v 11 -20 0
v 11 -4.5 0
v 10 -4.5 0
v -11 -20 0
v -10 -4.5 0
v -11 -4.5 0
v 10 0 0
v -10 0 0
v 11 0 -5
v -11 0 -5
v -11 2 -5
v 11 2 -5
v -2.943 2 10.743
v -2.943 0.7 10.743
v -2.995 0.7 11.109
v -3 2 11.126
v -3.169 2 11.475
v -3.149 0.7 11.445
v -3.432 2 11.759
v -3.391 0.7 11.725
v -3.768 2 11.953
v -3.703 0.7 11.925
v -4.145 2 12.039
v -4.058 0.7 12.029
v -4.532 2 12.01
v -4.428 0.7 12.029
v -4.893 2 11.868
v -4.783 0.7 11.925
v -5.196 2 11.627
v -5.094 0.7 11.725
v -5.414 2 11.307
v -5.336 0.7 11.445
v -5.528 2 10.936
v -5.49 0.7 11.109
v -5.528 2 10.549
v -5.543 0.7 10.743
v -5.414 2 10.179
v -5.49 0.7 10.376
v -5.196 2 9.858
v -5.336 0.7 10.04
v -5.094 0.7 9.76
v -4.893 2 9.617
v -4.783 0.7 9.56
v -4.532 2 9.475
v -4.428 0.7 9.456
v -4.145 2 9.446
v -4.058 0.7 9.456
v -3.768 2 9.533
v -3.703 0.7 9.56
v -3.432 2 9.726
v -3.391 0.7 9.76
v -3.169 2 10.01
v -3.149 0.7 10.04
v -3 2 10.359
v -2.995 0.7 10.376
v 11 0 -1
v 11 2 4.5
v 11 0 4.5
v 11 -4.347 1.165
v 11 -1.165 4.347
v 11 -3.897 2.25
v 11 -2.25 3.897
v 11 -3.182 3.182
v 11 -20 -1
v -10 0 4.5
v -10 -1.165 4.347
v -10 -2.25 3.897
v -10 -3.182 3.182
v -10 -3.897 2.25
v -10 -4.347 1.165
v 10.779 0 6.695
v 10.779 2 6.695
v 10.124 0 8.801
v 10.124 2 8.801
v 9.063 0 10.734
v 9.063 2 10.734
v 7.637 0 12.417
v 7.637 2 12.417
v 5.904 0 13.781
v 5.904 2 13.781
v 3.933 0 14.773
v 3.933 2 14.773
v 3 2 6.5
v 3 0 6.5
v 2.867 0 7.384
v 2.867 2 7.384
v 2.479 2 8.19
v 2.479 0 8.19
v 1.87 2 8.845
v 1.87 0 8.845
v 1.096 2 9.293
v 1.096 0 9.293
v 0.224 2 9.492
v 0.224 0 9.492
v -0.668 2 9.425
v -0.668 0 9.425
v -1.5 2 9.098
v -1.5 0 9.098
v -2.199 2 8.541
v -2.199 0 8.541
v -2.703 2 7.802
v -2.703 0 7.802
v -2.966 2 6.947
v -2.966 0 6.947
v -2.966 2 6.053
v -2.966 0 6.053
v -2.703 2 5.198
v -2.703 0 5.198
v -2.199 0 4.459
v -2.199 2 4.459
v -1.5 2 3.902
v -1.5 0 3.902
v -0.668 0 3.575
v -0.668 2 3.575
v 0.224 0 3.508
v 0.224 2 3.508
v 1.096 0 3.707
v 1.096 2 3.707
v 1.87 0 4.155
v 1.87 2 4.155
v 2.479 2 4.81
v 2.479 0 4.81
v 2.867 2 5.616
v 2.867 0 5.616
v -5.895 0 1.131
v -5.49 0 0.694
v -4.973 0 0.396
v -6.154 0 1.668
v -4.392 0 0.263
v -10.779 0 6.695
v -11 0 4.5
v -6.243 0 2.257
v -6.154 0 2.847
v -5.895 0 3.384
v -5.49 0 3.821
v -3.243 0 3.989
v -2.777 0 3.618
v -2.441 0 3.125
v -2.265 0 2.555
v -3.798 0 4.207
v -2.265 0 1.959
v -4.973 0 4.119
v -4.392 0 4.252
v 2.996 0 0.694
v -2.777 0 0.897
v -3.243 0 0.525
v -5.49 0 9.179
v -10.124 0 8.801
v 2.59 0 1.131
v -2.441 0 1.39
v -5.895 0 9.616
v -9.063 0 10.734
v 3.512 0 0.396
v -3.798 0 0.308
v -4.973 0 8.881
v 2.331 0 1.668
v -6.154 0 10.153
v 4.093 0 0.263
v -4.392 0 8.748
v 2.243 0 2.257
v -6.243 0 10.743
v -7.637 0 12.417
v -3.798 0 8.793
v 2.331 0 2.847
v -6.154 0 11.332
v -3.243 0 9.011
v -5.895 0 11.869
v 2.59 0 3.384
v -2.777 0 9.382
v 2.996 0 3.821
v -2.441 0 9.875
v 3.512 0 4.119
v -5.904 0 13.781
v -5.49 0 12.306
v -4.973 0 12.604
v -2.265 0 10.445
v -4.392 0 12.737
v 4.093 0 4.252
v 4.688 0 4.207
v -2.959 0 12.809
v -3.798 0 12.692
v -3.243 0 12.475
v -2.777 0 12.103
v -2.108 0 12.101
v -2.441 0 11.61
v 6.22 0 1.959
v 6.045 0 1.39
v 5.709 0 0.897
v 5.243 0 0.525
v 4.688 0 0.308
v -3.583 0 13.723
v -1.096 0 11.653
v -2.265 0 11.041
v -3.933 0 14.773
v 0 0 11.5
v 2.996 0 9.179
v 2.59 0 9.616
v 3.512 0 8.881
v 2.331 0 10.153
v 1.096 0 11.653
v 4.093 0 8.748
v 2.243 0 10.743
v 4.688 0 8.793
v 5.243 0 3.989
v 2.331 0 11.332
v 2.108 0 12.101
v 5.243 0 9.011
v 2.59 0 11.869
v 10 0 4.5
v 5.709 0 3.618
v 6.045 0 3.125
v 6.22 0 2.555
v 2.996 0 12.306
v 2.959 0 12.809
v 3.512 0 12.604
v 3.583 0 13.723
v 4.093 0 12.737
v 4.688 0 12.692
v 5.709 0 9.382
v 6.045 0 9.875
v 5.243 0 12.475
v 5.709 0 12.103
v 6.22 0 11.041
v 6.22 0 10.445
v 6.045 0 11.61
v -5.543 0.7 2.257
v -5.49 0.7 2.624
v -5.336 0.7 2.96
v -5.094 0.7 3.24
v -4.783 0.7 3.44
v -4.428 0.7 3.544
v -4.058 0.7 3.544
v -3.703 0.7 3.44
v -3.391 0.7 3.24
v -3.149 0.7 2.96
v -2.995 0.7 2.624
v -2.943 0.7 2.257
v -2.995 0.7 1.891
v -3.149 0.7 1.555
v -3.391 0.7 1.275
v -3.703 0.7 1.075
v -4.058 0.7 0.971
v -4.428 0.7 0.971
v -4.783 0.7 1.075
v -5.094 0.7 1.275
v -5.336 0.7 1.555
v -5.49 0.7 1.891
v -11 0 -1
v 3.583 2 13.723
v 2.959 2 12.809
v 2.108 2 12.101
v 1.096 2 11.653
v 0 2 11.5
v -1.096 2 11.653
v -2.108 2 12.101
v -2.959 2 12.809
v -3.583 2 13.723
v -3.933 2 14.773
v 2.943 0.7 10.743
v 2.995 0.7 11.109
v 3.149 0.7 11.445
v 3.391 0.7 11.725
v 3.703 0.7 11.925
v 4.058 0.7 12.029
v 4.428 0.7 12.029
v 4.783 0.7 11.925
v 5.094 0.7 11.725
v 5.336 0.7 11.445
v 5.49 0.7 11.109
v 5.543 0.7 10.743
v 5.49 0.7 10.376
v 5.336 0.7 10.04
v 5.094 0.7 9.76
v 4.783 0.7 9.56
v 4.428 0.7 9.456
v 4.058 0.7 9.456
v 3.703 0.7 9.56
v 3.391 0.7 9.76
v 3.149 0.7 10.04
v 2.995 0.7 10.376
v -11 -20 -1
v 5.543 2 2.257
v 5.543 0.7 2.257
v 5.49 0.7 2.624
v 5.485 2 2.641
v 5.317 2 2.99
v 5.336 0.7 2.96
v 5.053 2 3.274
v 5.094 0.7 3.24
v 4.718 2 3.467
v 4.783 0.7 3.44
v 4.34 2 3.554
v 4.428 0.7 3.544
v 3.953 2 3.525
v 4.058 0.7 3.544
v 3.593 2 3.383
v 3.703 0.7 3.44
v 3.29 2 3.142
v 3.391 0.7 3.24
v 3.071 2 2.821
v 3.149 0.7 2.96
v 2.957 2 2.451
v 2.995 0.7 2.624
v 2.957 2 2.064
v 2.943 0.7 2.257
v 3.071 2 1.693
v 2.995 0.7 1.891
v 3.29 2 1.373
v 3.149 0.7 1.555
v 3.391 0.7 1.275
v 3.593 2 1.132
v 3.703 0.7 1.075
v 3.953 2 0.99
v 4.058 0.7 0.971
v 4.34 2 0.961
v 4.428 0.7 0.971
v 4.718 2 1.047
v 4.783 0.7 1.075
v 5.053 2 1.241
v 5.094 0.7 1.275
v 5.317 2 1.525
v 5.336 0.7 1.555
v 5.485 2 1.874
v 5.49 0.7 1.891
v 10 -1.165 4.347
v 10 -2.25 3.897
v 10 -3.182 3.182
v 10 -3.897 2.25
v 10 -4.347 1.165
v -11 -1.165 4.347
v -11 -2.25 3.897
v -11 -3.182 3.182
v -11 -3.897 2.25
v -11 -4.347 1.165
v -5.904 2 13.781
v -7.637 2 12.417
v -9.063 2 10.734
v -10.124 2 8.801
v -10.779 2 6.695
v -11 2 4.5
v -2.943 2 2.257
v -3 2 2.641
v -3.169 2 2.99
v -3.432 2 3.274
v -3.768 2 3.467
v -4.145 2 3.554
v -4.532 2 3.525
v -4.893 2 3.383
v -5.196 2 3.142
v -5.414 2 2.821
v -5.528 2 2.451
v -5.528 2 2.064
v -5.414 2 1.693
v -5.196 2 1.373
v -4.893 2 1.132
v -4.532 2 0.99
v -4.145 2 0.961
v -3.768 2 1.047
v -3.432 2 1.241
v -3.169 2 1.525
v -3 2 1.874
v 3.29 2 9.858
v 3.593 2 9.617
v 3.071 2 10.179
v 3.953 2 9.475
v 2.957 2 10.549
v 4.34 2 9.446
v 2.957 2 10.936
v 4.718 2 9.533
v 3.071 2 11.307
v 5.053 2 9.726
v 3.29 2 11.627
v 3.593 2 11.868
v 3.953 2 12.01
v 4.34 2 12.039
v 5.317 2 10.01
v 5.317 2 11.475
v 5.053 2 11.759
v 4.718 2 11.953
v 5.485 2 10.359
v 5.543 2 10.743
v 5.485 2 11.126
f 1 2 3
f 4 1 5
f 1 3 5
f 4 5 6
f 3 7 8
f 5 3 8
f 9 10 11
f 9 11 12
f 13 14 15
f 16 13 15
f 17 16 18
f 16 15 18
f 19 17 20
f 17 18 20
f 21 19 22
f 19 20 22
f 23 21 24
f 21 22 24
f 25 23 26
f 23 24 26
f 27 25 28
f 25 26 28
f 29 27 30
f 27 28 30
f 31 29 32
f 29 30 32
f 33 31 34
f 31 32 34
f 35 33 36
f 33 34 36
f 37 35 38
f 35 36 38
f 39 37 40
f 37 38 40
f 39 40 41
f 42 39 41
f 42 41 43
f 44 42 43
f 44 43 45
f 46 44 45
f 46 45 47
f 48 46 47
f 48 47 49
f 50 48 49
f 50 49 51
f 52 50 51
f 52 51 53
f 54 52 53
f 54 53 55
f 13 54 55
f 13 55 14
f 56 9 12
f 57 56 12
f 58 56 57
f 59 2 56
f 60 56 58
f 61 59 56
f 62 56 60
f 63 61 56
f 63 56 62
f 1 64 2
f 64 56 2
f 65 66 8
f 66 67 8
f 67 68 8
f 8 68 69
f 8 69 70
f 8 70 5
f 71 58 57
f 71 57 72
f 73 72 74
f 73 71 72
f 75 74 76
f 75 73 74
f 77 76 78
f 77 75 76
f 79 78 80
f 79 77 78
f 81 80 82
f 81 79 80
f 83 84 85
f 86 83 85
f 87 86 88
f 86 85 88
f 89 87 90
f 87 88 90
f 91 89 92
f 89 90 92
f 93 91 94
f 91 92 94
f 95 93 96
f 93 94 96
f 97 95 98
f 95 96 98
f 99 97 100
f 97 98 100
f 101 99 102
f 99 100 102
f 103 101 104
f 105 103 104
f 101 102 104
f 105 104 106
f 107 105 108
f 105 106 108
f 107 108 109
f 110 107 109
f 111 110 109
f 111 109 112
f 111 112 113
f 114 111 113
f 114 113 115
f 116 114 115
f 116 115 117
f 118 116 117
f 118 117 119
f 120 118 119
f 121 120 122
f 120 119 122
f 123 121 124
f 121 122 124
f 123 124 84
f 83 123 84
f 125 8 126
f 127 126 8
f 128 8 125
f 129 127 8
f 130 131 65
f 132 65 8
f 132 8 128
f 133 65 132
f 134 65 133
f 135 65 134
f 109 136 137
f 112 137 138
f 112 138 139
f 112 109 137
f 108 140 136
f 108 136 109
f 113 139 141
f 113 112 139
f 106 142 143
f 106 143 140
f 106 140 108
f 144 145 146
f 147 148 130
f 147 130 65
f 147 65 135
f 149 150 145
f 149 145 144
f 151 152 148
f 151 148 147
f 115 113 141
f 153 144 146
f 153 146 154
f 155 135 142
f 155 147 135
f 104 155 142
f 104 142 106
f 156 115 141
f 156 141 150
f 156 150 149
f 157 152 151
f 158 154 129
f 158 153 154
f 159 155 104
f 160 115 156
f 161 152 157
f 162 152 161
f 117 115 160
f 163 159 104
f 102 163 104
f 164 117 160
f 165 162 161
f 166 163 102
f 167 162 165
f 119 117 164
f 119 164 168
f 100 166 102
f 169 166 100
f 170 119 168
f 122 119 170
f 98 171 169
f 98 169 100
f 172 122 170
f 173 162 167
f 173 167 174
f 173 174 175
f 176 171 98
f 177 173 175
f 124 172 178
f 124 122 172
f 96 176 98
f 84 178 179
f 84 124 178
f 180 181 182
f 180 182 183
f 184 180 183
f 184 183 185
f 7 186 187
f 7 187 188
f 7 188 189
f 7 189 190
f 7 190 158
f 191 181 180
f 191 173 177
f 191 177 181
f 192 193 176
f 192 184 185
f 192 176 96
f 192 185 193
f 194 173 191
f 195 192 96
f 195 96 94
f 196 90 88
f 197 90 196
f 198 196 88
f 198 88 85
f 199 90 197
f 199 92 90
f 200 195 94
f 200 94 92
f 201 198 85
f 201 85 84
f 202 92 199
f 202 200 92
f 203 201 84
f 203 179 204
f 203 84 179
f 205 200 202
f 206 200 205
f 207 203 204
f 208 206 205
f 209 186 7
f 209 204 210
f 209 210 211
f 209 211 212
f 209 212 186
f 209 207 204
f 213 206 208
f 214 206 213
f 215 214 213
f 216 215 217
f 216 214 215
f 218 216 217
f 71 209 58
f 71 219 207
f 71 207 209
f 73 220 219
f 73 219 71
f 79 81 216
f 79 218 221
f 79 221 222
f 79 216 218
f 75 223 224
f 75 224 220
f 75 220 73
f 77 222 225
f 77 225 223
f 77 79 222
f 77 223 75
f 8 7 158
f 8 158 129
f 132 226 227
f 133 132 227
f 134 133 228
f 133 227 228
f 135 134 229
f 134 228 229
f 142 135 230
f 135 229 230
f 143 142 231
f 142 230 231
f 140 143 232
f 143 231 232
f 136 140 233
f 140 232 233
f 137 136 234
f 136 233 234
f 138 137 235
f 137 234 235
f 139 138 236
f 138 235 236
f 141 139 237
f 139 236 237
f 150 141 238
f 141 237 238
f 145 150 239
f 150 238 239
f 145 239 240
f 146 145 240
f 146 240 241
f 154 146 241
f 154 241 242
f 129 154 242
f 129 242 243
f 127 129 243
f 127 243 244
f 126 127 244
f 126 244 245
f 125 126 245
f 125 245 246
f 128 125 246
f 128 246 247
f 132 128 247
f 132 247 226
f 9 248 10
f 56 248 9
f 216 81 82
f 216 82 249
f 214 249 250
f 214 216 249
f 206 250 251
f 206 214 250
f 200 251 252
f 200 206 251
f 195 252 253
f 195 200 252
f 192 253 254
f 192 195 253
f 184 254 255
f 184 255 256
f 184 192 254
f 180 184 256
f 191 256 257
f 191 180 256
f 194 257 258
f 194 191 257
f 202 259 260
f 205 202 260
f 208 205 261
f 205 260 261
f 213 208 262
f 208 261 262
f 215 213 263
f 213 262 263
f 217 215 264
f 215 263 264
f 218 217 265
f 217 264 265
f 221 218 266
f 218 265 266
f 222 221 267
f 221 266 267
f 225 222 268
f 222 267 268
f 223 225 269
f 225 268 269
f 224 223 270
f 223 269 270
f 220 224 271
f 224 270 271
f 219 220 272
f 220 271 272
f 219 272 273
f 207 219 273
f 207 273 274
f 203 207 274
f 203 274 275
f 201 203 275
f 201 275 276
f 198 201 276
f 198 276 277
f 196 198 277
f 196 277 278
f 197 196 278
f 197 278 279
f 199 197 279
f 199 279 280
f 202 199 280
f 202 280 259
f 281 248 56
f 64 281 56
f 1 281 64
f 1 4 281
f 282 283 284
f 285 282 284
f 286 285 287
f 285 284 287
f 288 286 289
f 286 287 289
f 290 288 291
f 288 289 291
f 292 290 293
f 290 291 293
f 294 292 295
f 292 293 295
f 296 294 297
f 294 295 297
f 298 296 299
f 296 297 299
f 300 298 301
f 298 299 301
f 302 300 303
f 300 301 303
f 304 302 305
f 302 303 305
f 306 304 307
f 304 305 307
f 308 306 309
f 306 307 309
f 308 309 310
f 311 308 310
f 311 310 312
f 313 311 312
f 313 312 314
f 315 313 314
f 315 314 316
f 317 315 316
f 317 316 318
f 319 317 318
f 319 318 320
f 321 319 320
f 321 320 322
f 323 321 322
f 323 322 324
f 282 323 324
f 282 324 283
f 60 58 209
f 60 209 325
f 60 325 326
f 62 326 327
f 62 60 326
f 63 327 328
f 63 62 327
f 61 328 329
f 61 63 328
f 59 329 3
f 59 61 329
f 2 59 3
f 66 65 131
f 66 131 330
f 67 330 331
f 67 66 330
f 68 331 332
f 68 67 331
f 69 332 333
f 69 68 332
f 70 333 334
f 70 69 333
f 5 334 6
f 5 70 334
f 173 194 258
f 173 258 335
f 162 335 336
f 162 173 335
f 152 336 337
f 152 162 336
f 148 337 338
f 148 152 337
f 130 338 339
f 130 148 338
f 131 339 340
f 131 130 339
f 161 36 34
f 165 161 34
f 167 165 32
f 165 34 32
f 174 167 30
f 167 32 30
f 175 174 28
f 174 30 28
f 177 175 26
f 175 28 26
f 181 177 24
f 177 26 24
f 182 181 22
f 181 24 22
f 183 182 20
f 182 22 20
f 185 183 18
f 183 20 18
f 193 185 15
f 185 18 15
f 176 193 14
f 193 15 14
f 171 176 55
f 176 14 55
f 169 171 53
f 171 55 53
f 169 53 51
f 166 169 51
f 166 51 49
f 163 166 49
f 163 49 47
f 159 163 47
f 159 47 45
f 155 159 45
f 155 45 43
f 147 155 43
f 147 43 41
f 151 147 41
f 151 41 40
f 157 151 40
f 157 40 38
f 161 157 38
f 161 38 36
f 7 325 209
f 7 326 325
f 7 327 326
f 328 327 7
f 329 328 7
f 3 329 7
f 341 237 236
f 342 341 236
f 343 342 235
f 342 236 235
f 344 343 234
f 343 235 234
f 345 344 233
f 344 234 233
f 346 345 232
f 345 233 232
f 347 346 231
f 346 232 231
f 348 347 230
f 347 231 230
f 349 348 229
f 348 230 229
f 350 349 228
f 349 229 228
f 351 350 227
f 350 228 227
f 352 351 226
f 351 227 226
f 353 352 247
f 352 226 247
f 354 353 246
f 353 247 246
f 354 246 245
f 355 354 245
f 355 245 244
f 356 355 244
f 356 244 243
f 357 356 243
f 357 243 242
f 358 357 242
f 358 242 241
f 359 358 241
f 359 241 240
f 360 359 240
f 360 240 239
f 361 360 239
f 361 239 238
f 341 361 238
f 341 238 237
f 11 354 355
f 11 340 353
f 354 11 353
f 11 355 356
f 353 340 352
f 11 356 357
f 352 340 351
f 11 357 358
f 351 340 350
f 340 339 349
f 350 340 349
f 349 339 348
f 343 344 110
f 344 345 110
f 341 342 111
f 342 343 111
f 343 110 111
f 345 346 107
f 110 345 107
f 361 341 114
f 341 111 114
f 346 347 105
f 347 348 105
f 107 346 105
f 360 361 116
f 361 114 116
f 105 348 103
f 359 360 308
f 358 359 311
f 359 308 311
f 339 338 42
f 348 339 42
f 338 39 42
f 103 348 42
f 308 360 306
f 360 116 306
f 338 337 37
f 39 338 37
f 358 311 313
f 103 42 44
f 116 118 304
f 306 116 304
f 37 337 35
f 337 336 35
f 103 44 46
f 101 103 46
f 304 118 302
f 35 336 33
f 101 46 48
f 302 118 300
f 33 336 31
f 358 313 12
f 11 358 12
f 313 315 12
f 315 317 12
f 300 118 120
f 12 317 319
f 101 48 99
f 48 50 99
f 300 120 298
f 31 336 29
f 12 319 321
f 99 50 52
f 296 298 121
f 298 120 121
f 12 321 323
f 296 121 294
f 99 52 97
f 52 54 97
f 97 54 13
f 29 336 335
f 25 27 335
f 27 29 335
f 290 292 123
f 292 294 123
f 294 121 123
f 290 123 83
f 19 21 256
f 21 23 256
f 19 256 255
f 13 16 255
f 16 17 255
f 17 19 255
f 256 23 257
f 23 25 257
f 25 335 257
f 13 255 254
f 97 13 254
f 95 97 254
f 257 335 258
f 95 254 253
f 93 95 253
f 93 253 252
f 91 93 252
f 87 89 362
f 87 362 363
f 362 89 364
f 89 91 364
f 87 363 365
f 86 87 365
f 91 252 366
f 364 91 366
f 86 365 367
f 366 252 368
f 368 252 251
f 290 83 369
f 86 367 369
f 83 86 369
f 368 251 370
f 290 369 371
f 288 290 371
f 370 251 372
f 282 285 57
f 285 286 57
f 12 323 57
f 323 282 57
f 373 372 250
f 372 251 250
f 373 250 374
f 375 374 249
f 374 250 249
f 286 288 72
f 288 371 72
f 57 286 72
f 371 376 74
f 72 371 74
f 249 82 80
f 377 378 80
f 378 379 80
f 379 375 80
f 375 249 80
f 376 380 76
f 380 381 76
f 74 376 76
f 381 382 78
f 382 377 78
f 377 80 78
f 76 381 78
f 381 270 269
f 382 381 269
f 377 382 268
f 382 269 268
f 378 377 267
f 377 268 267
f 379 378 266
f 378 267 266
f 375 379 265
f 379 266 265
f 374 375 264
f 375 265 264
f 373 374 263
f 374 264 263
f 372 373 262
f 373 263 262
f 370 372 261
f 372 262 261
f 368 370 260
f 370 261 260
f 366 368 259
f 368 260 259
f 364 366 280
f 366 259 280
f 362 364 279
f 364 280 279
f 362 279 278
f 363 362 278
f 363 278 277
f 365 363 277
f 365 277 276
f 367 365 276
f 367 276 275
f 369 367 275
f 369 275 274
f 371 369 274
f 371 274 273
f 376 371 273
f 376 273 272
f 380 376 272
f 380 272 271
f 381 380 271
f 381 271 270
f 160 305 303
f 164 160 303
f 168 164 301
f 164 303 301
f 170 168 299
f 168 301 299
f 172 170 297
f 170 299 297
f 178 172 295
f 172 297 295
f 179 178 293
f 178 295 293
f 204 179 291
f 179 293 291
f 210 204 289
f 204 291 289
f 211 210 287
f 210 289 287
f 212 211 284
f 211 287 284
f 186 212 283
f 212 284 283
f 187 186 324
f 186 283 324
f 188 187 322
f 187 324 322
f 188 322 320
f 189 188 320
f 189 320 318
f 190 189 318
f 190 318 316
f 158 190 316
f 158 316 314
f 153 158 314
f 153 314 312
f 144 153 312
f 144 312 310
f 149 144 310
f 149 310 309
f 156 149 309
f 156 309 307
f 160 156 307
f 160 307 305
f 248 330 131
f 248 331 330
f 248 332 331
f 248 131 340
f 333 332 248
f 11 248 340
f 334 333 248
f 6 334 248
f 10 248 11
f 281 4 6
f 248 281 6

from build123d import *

# Parameters (mm, degrees)
F0_R           = 1.3
F0_R_2         = 3
F0_W           = 22
F0_H           = 4
F0_W_2         = 1
F0_H_2         = 4.5
F1_DEPTH       = 2
F2_DEPTH       = 20
F3_ANGLE       = 91
F4_D           = 2
F4_DEPTH       = 3
F4_CSINK_D     = 4
F4_CSINK_ANGLE = 90


with BuildPart() as f1:
    # F0 (on Front) → F1 (new body)
    with BuildSketch(Plane.XZ):
        with BuildLine():
            Line((10, 4.5), (11, 4.5))
            ThreePointArc((11, 4.5), (9.062743, 10.734316), (3.933329, 14.772727))
            ThreePointArc((3.933329, 14.772727), (0, 11.5), (-3.933329, 14.772727))
            ThreePointArc((-3.933329, 14.772727), (-9.062743, 10.734316), (-11, 4.5))
            Line((-11, 4.5), (-10, 4.5))
            Line((-10, 4.5), (-10, 0))
            Line((-10, 0), (10, 0))
            Line((10, 0), (10, 4.5))
        make_face()
        with Locations((-4.242641, 2.257359)):
            Circle(F0_R, mode=Mode.SUBTRACT)
        with Locations((4.242641, 2.257359)):
            Circle(F0_R, mode=Mode.SUBTRACT)
        with Locations((-4.242641, 10.742641)):
            Circle(F0_R, mode=Mode.SUBTRACT)
        with Locations((0, 6.5)):
            Circle(F0_R_2, mode=Mode.SUBTRACT)
        with Locations((4.242641, 10.742641)):
            Circle(F0_R, mode=Mode.SUBTRACT)
        with Locations((0, -3)):
            Rectangle(F0_W, F0_H)
        Polygon((-11, -1), (11, -1), (11, 0), (10, 0), (-10, 0), (-11, 0), align=None)
        with Locations((-10.5, 2.25)):
            Rectangle(F0_W_2, F0_H_2)
        with Locations((10.5, 2.25)):
            Rectangle(F0_W_2, F0_H_2)
    extrude(amount=-F1_DEPTH)



with BuildPart() as f2:
    # F0 (on Front) → F2 (new body)
    with BuildSketch(Plane.XZ):
        Polygon((-11, -1), (11, -1), (11, 0), (10, 0), (-10, 0), (-11, 0), align=None)
    extrude(amount=F2_DEPTH)


with BuildPart() as f1_1:
    add(f1.part)

    add(f2.part)  # F3 merges F2
    # F0 (on Front) → F3 (revolve)
    with BuildSketch(Plane.XZ):
        with Locations((-10.5, 2.25)):
            Rectangle(F0_W_2, F0_H_2)
        with Locations((10.5, 2.25)):
            Rectangle(F0_W_2, F0_H_2)
    revolve(axis=Axis((0, 0, 0), (1, 0, 0)), revolution_arc=F3_ANGLE)

    # F4
    with Locations(Plane.XZ):
        with Locations((-4.242641, 10.742641), (-4.242641, 2.257359), (4.242641, 2.257359), (4.242641, 10.742641)):
            CounterSinkHole(F4_D / 2, F4_CSINK_D / 2, depth=F4_DEPTH, counter_sink_angle=F4_CSINK_ANGLE)


solid = f1_1.part
